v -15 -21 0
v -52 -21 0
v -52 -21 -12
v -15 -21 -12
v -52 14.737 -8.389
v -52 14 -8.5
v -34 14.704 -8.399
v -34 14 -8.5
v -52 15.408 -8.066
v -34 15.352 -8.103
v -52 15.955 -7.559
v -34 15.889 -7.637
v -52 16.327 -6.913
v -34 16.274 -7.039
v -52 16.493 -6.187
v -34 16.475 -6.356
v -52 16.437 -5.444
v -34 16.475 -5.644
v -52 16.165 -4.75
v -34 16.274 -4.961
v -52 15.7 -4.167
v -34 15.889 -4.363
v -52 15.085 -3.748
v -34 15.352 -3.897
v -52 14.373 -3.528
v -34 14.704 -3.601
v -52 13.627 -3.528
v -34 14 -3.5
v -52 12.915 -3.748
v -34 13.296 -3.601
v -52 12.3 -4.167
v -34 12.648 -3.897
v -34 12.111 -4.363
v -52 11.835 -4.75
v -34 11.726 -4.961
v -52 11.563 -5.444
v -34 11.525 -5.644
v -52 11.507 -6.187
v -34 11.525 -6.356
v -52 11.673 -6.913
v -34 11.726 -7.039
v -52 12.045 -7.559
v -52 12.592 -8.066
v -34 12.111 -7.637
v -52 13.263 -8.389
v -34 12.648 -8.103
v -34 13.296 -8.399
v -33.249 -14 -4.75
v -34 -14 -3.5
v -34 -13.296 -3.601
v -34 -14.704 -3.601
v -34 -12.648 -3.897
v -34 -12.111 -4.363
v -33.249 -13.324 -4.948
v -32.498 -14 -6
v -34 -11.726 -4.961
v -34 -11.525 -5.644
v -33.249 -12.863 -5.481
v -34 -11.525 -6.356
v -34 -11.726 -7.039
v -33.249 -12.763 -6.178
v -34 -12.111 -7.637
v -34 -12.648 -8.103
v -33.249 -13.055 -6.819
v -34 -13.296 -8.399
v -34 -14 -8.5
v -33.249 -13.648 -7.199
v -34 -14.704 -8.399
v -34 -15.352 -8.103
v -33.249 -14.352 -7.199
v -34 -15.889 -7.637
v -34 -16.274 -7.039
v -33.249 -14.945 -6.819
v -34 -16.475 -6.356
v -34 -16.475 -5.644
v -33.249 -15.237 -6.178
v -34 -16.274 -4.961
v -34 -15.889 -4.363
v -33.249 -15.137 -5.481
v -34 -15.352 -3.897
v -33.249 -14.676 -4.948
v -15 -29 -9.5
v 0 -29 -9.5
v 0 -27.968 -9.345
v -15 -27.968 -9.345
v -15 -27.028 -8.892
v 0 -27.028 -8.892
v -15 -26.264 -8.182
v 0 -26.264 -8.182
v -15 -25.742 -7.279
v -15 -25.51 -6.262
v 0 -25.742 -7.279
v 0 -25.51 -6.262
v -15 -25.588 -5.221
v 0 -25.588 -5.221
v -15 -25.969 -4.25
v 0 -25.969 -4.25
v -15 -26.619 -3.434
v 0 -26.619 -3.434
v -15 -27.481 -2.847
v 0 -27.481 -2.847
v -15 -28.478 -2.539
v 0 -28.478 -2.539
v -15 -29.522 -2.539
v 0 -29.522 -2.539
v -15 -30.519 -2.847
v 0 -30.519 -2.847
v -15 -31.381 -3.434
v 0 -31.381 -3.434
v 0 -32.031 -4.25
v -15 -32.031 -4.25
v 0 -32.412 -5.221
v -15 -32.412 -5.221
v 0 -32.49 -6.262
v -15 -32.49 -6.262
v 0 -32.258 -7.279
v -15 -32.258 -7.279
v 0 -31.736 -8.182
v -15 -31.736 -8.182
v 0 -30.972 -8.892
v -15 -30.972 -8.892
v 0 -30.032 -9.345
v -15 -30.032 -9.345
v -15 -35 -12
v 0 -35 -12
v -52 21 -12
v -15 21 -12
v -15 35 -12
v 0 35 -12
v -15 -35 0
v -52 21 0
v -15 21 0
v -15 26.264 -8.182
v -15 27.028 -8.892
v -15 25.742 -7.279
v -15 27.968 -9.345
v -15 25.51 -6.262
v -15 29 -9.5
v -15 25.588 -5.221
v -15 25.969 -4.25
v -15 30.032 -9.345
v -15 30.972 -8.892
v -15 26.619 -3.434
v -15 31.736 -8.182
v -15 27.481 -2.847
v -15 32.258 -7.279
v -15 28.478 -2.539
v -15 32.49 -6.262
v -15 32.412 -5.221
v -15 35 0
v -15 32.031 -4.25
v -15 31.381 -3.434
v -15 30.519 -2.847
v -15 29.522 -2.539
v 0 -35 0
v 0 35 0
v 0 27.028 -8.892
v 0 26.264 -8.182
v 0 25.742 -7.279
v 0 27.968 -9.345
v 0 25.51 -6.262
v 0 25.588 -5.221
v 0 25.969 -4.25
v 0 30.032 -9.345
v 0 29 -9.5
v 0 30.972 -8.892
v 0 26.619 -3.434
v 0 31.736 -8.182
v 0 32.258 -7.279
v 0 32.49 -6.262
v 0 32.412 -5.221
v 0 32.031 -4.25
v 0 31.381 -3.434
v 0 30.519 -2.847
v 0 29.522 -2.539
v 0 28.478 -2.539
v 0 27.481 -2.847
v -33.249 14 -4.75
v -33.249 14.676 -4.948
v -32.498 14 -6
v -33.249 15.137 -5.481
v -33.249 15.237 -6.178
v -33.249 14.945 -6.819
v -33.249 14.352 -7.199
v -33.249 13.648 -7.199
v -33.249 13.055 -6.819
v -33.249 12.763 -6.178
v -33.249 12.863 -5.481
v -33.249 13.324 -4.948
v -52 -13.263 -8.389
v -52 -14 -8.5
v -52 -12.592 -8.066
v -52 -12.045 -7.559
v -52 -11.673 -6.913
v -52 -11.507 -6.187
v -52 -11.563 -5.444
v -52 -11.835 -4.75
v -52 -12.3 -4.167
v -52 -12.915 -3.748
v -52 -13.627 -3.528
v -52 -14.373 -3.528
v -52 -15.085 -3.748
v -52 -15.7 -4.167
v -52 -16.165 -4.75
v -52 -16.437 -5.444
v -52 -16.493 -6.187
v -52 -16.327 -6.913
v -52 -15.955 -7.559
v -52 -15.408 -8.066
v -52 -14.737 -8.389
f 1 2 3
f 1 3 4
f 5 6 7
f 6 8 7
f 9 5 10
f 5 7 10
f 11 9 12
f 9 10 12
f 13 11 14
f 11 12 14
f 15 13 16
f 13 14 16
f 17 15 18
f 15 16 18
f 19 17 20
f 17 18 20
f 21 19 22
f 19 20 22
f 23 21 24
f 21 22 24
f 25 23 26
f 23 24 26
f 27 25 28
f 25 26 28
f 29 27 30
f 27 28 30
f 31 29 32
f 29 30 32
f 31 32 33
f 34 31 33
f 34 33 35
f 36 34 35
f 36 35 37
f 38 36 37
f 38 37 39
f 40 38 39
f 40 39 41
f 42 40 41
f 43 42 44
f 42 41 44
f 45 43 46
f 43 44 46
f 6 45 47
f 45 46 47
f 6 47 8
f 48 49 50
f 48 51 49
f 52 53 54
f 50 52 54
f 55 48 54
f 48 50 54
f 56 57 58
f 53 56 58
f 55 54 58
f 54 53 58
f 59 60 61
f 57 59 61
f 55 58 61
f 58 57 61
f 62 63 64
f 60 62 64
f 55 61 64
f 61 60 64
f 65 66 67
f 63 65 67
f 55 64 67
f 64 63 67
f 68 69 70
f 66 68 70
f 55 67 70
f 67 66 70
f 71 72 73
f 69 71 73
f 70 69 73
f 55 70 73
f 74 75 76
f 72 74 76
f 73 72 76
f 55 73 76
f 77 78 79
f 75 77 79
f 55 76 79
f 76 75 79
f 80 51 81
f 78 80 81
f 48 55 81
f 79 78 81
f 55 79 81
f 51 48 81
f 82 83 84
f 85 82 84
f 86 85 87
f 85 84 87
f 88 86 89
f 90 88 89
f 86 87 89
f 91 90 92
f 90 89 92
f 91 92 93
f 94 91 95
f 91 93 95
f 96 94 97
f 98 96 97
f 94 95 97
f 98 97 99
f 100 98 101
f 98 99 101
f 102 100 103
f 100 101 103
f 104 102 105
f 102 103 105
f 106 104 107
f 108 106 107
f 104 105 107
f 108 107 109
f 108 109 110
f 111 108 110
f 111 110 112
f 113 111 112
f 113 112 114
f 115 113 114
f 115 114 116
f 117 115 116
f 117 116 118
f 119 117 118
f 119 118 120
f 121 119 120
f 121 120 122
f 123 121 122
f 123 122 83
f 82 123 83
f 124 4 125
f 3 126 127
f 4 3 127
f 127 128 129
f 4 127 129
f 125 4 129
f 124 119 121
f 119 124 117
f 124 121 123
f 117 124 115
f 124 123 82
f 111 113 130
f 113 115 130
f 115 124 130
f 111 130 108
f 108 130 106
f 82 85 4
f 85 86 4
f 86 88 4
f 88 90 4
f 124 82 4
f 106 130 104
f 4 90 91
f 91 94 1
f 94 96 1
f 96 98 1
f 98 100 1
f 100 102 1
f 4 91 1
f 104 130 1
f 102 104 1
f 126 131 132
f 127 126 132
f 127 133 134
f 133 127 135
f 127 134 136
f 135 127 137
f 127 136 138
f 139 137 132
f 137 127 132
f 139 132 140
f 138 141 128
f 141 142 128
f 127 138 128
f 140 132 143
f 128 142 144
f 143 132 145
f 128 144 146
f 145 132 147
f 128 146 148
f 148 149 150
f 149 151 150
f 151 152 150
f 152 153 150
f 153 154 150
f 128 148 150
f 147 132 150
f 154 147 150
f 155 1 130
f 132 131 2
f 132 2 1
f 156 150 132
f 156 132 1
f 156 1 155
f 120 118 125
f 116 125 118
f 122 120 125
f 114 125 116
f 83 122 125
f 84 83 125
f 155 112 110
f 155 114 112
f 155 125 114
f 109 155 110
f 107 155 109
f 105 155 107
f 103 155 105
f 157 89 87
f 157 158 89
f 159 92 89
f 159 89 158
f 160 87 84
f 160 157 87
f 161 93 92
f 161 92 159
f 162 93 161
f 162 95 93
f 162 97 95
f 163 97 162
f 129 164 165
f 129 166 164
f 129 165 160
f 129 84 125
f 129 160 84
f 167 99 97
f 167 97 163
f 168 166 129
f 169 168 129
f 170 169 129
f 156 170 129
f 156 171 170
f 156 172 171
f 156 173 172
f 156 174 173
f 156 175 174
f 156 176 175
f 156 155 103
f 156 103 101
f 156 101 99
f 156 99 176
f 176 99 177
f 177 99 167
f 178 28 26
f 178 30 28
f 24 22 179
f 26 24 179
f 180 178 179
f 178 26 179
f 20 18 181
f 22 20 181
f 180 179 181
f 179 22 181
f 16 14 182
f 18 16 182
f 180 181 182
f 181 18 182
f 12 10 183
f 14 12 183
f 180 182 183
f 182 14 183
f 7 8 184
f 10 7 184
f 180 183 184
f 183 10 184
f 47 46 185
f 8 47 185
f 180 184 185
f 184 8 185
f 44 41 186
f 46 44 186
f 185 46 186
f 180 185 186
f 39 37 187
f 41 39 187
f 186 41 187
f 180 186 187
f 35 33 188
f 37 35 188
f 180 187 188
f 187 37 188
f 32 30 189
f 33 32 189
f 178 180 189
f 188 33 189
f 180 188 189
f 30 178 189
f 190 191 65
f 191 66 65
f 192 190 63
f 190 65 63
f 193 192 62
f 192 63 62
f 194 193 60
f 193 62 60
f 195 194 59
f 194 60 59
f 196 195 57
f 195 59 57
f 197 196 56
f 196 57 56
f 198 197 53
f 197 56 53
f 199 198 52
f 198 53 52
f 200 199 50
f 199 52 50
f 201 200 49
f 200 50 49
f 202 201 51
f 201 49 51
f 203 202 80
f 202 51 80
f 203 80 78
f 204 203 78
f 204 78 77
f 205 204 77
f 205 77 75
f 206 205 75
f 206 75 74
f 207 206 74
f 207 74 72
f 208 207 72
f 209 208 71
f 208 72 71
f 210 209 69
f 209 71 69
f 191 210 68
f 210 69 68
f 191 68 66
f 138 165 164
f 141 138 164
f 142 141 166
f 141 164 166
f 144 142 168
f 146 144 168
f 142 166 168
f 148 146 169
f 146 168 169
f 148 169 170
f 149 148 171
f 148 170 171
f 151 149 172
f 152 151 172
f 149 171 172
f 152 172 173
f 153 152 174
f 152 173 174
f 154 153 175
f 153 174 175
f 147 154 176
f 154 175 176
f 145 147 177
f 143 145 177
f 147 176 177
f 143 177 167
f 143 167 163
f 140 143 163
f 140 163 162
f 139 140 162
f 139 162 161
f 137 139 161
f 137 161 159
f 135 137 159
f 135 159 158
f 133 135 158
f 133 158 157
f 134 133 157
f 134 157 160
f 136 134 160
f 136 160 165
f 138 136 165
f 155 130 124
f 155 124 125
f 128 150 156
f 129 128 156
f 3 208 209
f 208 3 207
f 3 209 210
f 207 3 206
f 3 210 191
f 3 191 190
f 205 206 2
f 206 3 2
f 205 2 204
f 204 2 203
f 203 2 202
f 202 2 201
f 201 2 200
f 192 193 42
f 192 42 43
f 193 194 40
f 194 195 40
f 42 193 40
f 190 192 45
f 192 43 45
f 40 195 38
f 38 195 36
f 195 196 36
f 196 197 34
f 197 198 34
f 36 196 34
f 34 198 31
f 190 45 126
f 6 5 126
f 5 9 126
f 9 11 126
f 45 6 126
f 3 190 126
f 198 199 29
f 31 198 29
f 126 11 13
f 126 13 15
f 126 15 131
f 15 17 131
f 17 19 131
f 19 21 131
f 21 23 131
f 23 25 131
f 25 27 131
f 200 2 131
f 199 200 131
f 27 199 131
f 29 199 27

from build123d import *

# Parameters (mm, degrees)
SKETCH1_W                    = 52
SKETCH1_H                    = 70
BOSS_EXTRUDE1_DEPTH          = 12
SKETCH2_W                    = 37
SKETCH2_H                    = 14
CUT_EXTRUDE1_DEPTH           = 64.820059542
F_7_0_7_DIAMETER_HOLE1_D     = 7
F_7_0_7_DIAMETER_HOLE1_DEPTH = 60
F_7_0_7_DIAMETER_HOLE1_TIP   = 2.103012167
M6X1_0_TAPPED_HOLE1_D        = 5
M6X1_0_TAPPED_HOLE1_DEPTH    = 18
M6X1_0_TAPPED_HOLE1_TIP      = 1.502151548


with BuildPart() as part:
    # Sketch1 → Boss-Extrude1 (new body)
    with BuildSketch(Plane.XY):
        with Locations((-26, 0)):
            Rectangle(SKETCH1_W, SKETCH1_H)
    extrude(amount=-BOSS_EXTRUDE1_DEPTH)

    # Sketch2 → Cut-Extrude1 (cut, through all)
    with BuildSketch(Plane.XY):
        with Locations((-33.5, 28)):
            Rectangle(SKETCH2_W, SKETCH2_H)
        with Locations((-33.5, -28)):
            Rectangle(SKETCH2_W, SKETCH2_H)
    extrude(amount=-CUT_EXTRUDE1_DEPTH, mode=Mode.SUBTRACT)

    # Ø7.0 (7) Diameter Hole1
    with Locations(Plane.ZY.offset(15)):
        with Locations((-6, 29), (-6, -29)):
            Hole(F_7_0_7_DIAMETER_HOLE1_D / 2, depth=F_7_0_7_DIAMETER_HOLE1_DEPTH)
            with Locations((0, 0, -(F_7_0_7_DIAMETER_HOLE1_DEPTH + F_7_0_7_DIAMETER_HOLE1_TIP / 2))):  # 118° drill point
                Cone(0, F_7_0_7_DIAMETER_HOLE1_D / 2, F_7_0_7_DIAMETER_HOLE1_TIP, mode=Mode.SUBTRACT)

    # M6x1.0 Tapped Hole1
    with Locations(Plane.ZY.offset(52)):
        with Locations((-6, 14), (-6, -14)):
            Hole(M6X1_0_TAPPED_HOLE1_D / 2, depth=M6X1_0_TAPPED_HOLE1_DEPTH)
            with Locations((0, 0, -(M6X1_0_TAPPED_HOLE1_DEPTH + M6X1_0_TAPPED_HOLE1_TIP / 2))):  # 118° drill point
                Cone(0, M6X1_0_TAPPED_HOLE1_D / 2, M6X1_0_TAPPED_HOLE1_TIP, mode=Mode.SUBTRACT)


solid = part.part
